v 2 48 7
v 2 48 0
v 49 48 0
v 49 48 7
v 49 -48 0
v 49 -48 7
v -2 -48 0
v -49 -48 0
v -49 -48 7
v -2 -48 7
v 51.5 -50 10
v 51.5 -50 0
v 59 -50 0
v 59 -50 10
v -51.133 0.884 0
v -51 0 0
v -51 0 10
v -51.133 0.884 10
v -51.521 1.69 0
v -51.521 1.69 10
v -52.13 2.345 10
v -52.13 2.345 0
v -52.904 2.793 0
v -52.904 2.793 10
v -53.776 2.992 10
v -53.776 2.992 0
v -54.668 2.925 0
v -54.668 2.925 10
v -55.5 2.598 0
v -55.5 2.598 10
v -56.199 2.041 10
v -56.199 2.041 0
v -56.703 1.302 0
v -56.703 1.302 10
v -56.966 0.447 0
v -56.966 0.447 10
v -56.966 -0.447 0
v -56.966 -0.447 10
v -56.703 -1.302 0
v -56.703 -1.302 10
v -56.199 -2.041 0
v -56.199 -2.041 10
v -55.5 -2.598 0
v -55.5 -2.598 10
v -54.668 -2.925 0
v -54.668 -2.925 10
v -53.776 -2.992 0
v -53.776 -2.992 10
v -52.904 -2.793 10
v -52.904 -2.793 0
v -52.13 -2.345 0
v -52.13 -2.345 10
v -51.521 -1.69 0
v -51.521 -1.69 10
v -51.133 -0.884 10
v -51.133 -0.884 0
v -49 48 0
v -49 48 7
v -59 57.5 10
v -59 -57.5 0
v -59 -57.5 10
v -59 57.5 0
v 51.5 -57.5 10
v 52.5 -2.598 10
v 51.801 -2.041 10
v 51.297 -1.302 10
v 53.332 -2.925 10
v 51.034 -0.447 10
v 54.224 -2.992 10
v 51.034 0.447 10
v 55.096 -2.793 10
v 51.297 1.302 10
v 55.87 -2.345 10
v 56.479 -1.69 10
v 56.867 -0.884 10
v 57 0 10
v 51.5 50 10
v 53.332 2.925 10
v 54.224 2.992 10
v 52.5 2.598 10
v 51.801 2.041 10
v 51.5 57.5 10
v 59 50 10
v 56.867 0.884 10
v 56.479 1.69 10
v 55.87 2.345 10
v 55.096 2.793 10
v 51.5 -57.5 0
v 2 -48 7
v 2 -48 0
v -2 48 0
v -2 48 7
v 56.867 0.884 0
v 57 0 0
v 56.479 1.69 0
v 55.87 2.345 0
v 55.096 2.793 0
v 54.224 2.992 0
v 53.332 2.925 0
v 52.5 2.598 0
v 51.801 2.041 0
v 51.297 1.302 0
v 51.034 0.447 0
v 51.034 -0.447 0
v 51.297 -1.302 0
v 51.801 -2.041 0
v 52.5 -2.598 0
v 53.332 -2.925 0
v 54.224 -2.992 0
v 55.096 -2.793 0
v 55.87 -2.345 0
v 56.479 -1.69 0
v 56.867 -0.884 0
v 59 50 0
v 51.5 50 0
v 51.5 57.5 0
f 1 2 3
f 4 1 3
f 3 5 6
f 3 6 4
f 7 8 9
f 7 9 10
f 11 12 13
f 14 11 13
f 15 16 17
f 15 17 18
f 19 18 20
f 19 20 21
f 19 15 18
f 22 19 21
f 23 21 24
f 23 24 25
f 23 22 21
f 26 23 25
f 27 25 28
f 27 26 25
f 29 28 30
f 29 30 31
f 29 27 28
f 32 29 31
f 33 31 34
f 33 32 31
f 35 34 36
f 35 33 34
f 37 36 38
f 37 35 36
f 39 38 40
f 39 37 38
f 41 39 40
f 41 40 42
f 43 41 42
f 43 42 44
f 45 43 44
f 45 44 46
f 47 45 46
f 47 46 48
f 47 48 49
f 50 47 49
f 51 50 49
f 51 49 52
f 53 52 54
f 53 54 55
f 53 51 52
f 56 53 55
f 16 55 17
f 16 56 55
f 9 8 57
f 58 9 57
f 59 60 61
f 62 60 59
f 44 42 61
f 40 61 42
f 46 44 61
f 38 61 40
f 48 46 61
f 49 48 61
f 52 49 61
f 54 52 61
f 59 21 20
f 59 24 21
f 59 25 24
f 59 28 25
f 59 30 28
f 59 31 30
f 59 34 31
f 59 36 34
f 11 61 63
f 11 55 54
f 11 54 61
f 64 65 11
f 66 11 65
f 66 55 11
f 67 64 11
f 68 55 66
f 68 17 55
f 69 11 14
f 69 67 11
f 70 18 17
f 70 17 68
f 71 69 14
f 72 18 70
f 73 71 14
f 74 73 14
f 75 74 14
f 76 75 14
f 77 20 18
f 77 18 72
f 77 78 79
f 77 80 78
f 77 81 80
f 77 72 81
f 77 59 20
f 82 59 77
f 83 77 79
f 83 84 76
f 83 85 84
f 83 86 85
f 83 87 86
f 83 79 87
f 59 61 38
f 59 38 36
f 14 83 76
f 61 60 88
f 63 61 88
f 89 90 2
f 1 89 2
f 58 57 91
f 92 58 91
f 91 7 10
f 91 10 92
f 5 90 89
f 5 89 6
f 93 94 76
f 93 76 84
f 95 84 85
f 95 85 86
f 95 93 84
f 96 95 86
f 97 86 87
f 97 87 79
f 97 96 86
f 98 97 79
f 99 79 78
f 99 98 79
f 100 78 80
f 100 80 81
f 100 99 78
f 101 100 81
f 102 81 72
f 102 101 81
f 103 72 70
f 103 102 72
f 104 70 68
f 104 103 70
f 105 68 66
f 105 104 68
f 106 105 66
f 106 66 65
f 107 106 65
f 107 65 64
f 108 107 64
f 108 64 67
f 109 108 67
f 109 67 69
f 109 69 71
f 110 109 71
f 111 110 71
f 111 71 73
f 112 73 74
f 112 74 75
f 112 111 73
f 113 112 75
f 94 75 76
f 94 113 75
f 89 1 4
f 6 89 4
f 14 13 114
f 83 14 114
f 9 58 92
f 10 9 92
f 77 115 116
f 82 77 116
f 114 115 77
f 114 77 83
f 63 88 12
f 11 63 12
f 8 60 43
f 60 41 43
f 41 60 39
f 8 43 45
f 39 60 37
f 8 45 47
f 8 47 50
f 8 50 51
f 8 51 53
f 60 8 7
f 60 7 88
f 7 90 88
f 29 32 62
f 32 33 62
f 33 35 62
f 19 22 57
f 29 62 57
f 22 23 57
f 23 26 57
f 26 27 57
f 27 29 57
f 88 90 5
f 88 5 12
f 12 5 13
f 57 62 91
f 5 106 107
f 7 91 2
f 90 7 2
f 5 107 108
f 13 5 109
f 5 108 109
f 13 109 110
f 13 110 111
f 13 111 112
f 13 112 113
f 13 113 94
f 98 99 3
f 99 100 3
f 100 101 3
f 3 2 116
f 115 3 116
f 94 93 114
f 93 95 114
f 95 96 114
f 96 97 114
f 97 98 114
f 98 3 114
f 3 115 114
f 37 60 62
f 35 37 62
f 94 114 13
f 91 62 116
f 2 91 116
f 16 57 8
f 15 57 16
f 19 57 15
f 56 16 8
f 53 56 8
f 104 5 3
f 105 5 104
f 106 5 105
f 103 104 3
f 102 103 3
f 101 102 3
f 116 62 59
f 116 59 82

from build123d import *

# Parameters (mm, degrees)
F0_W     = 118
F0_H     = 115
F0_R     = 3
F2_DEPTH = 10
F1_W     = 47
F1_H     = 96
F3_DEPTH = 7
F4_W     = 7.5
F4_H     = 7.5
F5_DEPTH = 25


with BuildPart() as f2:
    # F0 (on Top) → F2 (new body)
    with BuildSketch(Plane.XY):
        Rectangle(F0_W, F0_H)
        with Locations((-54, 0)):
            Circle(F0_R, mode=Mode.SUBTRACT)
        with Locations((54, 0)):
            Circle(F0_R, mode=Mode.SUBTRACT)
    extrude(amount=F2_DEPTH)

    # F1 (on Top) → F3 (cut)
    with BuildSketch(Plane.XY):
        with Locations((-25.5, 0)):
            Rectangle(F1_W, F1_H)
        with Locations((25.5, 0)):
            Rectangle(F1_W, F1_H)
    extrude(amount=F3_DEPTH, mode=Mode.SUBTRACT)

    # F4 (on Top) → F5 (cut)
    with BuildSketch(Plane.XY):
        with Locations((55.25, -53.75)):
            Rectangle(F4_W, F4_H)
        with Locations((55.25, 53.75)):
            Rectangle(F4_W, F4_H)
    extrude(amount=F5_DEPTH, mode=Mode.SUBTRACT)


solid = f2.part
